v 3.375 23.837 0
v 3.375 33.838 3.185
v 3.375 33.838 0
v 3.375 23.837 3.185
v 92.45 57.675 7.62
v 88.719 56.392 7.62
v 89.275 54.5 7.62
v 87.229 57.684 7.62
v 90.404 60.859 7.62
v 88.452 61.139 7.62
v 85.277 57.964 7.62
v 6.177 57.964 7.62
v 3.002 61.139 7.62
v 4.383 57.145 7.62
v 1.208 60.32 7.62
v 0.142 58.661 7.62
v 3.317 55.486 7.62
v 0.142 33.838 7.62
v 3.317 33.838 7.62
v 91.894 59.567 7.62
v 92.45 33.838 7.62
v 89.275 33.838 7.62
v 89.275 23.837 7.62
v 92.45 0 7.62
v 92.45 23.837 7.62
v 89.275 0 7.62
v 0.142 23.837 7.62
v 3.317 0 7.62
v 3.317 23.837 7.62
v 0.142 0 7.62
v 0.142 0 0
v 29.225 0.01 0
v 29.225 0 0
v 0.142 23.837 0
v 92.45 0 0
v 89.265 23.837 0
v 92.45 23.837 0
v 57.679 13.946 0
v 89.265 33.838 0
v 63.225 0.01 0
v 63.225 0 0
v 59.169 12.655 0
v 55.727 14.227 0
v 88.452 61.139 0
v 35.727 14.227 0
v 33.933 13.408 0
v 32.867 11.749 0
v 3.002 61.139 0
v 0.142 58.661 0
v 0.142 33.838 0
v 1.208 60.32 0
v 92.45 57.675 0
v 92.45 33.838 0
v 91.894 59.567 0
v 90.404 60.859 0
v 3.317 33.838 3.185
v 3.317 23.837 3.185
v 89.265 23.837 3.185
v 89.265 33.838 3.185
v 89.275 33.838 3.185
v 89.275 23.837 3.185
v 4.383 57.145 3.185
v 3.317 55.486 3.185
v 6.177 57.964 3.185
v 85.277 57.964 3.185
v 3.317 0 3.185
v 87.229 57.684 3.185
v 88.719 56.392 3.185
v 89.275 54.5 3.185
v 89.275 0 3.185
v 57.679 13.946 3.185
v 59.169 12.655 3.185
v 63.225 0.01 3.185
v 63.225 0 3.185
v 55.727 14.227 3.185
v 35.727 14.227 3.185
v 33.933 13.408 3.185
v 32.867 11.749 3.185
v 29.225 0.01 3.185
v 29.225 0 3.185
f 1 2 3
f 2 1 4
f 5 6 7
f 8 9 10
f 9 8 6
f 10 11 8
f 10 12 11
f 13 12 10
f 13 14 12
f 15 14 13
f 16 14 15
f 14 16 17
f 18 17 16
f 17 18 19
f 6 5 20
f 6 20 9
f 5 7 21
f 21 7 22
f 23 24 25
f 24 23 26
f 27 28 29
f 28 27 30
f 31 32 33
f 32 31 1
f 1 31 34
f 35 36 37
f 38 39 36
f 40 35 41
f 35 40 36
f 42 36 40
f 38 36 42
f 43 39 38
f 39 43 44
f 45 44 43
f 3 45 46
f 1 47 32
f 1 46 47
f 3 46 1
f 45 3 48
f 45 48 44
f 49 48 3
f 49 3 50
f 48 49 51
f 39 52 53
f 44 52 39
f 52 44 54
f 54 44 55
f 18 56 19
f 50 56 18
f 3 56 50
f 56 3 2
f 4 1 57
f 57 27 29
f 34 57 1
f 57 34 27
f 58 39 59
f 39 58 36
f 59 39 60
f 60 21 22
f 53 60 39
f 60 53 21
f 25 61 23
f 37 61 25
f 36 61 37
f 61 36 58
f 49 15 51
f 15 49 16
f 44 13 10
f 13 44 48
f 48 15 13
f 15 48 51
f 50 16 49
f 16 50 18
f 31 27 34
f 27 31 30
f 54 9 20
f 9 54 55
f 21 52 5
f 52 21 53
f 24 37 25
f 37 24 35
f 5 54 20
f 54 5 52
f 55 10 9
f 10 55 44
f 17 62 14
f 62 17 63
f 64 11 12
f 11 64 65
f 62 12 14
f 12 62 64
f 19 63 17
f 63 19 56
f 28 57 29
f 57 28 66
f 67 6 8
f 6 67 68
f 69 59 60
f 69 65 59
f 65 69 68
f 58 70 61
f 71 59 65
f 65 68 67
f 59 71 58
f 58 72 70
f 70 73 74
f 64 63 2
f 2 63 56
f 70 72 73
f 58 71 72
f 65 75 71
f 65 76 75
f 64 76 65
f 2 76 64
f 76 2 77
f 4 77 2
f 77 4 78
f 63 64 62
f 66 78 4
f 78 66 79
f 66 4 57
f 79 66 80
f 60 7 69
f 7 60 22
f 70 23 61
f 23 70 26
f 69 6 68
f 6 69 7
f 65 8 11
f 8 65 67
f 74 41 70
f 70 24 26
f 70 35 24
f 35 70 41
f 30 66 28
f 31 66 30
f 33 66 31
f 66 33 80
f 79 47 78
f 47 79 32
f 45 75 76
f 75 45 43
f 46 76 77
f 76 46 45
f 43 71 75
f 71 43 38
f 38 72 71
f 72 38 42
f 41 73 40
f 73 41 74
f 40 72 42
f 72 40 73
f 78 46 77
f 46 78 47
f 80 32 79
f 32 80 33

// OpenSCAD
wallet_3d=true; //set to false for 2d view but cannot use the online Customizer
logo=false; //if you want a .dxf logo to be added, set to true, but you cannot use the online Customizer and it doesn't affect the 2d view
card_width=86.1;
card_length=54.5;
card_radius=3.5;
wall_thickness=0.125*25.4;
material_thickness=0.3*25.4;//used for 3d view only
card_thickness=material_thickness-0.125*25.4;//used for 3d view only
band_inset_width=wall_thickness;//taken from both the left and right sides along the card width
band_inset_length=10;//how wide to make the band cutout along the length of the card
card_inset_width=20;//amount of inset along the top
card_inset_length=card_width/8;//amount of inset along the top
if (wallet_3d==true){$fn=30;}


if (wallet_3d==true){
slim_wallet_3d();
}
if (wallet_3d==false){
slim_wallet_2d();
}

module slim_wallet_3d(){
difference(){
solid_wallet_3d();
translate([wall_thickness,0,material_thickness-card_thickness+0.01])
solid_card_3d();
card_inset_3d();
translate([0,-10,0])
cube([card_width+10,10,material_thickness]);
band_inset_3d();
rotate([0,0,90]) 
if (logo==true){
//tweak logo position below - may be helpful to put a # before the logo() below to make it easier to see the location of the logo
translate([19,-70,0]) 
difference(){//the example logo needed to be reversed so I removed it from a cube but if your logo doesn't need this then you can remove the difference/cube and just do the logo()
cube([36,49.8,2]);
translate([-2,-81,0])
logo(2);
}
}
}
}


module solid_card_3d(){
hull(){
translate([card_radius,0,0])
cylinder(r=card_radius,h=card_thickness);
translate([card_width-card_radius,0])
cylinder(r=card_radius,h=card_thickness);
translate([card_radius,card_length,0])
cylinder(r=card_radius,h=card_thickness);
translate([card_width-card_radius,card_length,0])
cylinder(r=card_radius,h=card_thickness);
}
}

module solid_wallet_3d(){
hull(){
translate([card_radius,0])
cylinder(r=card_radius,h=material_thickness);
translate([card_width-card_radius+2*wall_thickness,0,0])
cylinder(r=card_radius,h=material_thickness);
translate([card_radius,card_length+wall_thickness,0])
cylinder(r=card_radius,h=material_thickness);
translate([card_width-card_radius+2*wall_thickness,card_length+wall_thickness,0])
cylinder(r=card_radius,h=material_thickness);
}
}

module card_inset_3d(){
hull(){
translate([wall_thickness+card_width/2-card_inset_width/2,card_inset_length,0])
cylinder(r=card_radius,h=material_thickness);
translate([wall_thickness+card_width/2+card_inset_width/2,card_inset_length,0])
cylinder(r=card_radius,h=material_thickness);
translate([wall_thickness+card_width/2-card_inset_width/2-2*card_radius,0,0])
cube([card_inset_width+4*card_radius,0.01,material_thickness]);
}
}

module band_inset_3d(){
translate([0,(card_length+wall_thickness)/2-band_inset_length/2,0])
cube([band_inset_width+0.2,band_inset_length,material_thickness]);
translate([2*wall_thickness+card_width-band_inset_width-0.01,(card_length+wall_thickness)/2-band_inset_length/2,0])
cube([band_inset_width+0.02,band_inset_length,material_thickness]);
}

module logo(height) {
    linear_extrude(height = height) {
        scale(1)
        import("IronMan.dxf");
    }
}

module slim_wallet_2d(){
difference(){
solid_wallet();
translate([wall_thickness,0])
difference(){solid_card();card_inset();}
translate([0,-10])
square([card_width+10,10]);
band_inset();
}
square([card_width+2*wall_thickness,0.01]);
}

module solid_card(){
hull(){
translate([card_radius,0])
circle(r=card_radius);
translate([card_width-card_radius,0])
circle(r=card_radius);
translate([card_radius,card_length])
circle(r=card_radius);
translate([card_width-card_radius,card_length])
circle(r=card_radius);
}
}

module solid_wallet(){
hull(){
translate([card_radius,0])
circle(r=card_radius);
translate([card_width-card_radius+2*wall_thickness,0])
circle(r=card_radius);
translate([card_radius,card_length+wall_thickness])
circle(r=card_radius);
translate([card_width-card_radius+2*wall_thickness,card_length+wall_thickness])
circle(r=card_radius);
}
}

module card_inset(){
translate([-card_radius,0])
hull(){
translate([wall_thickness+card_width/2-card_inset_width/2,card_inset_length])
circle(r=card_radius);
translate([wall_thickness+card_width/2+card_inset_width/2,card_inset_length])
circle(r=card_radius);
translate([wall_thickness+card_width/2-card_inset_width/2-2*card_radius,0])
square([card_inset_width+4*card_radius,0.01]);
}
}

module band_inset(){
translate([0,(card_length+wall_thickness)/2-band_inset_length/2])
square([band_inset_width,band_inset_length]);
translate([2*wall_thickness+card_width-band_inset_width,(card_length+wall_thickness)/2-band_inset_length/2])
square([band_inset_width,band_inset_length]);
}
